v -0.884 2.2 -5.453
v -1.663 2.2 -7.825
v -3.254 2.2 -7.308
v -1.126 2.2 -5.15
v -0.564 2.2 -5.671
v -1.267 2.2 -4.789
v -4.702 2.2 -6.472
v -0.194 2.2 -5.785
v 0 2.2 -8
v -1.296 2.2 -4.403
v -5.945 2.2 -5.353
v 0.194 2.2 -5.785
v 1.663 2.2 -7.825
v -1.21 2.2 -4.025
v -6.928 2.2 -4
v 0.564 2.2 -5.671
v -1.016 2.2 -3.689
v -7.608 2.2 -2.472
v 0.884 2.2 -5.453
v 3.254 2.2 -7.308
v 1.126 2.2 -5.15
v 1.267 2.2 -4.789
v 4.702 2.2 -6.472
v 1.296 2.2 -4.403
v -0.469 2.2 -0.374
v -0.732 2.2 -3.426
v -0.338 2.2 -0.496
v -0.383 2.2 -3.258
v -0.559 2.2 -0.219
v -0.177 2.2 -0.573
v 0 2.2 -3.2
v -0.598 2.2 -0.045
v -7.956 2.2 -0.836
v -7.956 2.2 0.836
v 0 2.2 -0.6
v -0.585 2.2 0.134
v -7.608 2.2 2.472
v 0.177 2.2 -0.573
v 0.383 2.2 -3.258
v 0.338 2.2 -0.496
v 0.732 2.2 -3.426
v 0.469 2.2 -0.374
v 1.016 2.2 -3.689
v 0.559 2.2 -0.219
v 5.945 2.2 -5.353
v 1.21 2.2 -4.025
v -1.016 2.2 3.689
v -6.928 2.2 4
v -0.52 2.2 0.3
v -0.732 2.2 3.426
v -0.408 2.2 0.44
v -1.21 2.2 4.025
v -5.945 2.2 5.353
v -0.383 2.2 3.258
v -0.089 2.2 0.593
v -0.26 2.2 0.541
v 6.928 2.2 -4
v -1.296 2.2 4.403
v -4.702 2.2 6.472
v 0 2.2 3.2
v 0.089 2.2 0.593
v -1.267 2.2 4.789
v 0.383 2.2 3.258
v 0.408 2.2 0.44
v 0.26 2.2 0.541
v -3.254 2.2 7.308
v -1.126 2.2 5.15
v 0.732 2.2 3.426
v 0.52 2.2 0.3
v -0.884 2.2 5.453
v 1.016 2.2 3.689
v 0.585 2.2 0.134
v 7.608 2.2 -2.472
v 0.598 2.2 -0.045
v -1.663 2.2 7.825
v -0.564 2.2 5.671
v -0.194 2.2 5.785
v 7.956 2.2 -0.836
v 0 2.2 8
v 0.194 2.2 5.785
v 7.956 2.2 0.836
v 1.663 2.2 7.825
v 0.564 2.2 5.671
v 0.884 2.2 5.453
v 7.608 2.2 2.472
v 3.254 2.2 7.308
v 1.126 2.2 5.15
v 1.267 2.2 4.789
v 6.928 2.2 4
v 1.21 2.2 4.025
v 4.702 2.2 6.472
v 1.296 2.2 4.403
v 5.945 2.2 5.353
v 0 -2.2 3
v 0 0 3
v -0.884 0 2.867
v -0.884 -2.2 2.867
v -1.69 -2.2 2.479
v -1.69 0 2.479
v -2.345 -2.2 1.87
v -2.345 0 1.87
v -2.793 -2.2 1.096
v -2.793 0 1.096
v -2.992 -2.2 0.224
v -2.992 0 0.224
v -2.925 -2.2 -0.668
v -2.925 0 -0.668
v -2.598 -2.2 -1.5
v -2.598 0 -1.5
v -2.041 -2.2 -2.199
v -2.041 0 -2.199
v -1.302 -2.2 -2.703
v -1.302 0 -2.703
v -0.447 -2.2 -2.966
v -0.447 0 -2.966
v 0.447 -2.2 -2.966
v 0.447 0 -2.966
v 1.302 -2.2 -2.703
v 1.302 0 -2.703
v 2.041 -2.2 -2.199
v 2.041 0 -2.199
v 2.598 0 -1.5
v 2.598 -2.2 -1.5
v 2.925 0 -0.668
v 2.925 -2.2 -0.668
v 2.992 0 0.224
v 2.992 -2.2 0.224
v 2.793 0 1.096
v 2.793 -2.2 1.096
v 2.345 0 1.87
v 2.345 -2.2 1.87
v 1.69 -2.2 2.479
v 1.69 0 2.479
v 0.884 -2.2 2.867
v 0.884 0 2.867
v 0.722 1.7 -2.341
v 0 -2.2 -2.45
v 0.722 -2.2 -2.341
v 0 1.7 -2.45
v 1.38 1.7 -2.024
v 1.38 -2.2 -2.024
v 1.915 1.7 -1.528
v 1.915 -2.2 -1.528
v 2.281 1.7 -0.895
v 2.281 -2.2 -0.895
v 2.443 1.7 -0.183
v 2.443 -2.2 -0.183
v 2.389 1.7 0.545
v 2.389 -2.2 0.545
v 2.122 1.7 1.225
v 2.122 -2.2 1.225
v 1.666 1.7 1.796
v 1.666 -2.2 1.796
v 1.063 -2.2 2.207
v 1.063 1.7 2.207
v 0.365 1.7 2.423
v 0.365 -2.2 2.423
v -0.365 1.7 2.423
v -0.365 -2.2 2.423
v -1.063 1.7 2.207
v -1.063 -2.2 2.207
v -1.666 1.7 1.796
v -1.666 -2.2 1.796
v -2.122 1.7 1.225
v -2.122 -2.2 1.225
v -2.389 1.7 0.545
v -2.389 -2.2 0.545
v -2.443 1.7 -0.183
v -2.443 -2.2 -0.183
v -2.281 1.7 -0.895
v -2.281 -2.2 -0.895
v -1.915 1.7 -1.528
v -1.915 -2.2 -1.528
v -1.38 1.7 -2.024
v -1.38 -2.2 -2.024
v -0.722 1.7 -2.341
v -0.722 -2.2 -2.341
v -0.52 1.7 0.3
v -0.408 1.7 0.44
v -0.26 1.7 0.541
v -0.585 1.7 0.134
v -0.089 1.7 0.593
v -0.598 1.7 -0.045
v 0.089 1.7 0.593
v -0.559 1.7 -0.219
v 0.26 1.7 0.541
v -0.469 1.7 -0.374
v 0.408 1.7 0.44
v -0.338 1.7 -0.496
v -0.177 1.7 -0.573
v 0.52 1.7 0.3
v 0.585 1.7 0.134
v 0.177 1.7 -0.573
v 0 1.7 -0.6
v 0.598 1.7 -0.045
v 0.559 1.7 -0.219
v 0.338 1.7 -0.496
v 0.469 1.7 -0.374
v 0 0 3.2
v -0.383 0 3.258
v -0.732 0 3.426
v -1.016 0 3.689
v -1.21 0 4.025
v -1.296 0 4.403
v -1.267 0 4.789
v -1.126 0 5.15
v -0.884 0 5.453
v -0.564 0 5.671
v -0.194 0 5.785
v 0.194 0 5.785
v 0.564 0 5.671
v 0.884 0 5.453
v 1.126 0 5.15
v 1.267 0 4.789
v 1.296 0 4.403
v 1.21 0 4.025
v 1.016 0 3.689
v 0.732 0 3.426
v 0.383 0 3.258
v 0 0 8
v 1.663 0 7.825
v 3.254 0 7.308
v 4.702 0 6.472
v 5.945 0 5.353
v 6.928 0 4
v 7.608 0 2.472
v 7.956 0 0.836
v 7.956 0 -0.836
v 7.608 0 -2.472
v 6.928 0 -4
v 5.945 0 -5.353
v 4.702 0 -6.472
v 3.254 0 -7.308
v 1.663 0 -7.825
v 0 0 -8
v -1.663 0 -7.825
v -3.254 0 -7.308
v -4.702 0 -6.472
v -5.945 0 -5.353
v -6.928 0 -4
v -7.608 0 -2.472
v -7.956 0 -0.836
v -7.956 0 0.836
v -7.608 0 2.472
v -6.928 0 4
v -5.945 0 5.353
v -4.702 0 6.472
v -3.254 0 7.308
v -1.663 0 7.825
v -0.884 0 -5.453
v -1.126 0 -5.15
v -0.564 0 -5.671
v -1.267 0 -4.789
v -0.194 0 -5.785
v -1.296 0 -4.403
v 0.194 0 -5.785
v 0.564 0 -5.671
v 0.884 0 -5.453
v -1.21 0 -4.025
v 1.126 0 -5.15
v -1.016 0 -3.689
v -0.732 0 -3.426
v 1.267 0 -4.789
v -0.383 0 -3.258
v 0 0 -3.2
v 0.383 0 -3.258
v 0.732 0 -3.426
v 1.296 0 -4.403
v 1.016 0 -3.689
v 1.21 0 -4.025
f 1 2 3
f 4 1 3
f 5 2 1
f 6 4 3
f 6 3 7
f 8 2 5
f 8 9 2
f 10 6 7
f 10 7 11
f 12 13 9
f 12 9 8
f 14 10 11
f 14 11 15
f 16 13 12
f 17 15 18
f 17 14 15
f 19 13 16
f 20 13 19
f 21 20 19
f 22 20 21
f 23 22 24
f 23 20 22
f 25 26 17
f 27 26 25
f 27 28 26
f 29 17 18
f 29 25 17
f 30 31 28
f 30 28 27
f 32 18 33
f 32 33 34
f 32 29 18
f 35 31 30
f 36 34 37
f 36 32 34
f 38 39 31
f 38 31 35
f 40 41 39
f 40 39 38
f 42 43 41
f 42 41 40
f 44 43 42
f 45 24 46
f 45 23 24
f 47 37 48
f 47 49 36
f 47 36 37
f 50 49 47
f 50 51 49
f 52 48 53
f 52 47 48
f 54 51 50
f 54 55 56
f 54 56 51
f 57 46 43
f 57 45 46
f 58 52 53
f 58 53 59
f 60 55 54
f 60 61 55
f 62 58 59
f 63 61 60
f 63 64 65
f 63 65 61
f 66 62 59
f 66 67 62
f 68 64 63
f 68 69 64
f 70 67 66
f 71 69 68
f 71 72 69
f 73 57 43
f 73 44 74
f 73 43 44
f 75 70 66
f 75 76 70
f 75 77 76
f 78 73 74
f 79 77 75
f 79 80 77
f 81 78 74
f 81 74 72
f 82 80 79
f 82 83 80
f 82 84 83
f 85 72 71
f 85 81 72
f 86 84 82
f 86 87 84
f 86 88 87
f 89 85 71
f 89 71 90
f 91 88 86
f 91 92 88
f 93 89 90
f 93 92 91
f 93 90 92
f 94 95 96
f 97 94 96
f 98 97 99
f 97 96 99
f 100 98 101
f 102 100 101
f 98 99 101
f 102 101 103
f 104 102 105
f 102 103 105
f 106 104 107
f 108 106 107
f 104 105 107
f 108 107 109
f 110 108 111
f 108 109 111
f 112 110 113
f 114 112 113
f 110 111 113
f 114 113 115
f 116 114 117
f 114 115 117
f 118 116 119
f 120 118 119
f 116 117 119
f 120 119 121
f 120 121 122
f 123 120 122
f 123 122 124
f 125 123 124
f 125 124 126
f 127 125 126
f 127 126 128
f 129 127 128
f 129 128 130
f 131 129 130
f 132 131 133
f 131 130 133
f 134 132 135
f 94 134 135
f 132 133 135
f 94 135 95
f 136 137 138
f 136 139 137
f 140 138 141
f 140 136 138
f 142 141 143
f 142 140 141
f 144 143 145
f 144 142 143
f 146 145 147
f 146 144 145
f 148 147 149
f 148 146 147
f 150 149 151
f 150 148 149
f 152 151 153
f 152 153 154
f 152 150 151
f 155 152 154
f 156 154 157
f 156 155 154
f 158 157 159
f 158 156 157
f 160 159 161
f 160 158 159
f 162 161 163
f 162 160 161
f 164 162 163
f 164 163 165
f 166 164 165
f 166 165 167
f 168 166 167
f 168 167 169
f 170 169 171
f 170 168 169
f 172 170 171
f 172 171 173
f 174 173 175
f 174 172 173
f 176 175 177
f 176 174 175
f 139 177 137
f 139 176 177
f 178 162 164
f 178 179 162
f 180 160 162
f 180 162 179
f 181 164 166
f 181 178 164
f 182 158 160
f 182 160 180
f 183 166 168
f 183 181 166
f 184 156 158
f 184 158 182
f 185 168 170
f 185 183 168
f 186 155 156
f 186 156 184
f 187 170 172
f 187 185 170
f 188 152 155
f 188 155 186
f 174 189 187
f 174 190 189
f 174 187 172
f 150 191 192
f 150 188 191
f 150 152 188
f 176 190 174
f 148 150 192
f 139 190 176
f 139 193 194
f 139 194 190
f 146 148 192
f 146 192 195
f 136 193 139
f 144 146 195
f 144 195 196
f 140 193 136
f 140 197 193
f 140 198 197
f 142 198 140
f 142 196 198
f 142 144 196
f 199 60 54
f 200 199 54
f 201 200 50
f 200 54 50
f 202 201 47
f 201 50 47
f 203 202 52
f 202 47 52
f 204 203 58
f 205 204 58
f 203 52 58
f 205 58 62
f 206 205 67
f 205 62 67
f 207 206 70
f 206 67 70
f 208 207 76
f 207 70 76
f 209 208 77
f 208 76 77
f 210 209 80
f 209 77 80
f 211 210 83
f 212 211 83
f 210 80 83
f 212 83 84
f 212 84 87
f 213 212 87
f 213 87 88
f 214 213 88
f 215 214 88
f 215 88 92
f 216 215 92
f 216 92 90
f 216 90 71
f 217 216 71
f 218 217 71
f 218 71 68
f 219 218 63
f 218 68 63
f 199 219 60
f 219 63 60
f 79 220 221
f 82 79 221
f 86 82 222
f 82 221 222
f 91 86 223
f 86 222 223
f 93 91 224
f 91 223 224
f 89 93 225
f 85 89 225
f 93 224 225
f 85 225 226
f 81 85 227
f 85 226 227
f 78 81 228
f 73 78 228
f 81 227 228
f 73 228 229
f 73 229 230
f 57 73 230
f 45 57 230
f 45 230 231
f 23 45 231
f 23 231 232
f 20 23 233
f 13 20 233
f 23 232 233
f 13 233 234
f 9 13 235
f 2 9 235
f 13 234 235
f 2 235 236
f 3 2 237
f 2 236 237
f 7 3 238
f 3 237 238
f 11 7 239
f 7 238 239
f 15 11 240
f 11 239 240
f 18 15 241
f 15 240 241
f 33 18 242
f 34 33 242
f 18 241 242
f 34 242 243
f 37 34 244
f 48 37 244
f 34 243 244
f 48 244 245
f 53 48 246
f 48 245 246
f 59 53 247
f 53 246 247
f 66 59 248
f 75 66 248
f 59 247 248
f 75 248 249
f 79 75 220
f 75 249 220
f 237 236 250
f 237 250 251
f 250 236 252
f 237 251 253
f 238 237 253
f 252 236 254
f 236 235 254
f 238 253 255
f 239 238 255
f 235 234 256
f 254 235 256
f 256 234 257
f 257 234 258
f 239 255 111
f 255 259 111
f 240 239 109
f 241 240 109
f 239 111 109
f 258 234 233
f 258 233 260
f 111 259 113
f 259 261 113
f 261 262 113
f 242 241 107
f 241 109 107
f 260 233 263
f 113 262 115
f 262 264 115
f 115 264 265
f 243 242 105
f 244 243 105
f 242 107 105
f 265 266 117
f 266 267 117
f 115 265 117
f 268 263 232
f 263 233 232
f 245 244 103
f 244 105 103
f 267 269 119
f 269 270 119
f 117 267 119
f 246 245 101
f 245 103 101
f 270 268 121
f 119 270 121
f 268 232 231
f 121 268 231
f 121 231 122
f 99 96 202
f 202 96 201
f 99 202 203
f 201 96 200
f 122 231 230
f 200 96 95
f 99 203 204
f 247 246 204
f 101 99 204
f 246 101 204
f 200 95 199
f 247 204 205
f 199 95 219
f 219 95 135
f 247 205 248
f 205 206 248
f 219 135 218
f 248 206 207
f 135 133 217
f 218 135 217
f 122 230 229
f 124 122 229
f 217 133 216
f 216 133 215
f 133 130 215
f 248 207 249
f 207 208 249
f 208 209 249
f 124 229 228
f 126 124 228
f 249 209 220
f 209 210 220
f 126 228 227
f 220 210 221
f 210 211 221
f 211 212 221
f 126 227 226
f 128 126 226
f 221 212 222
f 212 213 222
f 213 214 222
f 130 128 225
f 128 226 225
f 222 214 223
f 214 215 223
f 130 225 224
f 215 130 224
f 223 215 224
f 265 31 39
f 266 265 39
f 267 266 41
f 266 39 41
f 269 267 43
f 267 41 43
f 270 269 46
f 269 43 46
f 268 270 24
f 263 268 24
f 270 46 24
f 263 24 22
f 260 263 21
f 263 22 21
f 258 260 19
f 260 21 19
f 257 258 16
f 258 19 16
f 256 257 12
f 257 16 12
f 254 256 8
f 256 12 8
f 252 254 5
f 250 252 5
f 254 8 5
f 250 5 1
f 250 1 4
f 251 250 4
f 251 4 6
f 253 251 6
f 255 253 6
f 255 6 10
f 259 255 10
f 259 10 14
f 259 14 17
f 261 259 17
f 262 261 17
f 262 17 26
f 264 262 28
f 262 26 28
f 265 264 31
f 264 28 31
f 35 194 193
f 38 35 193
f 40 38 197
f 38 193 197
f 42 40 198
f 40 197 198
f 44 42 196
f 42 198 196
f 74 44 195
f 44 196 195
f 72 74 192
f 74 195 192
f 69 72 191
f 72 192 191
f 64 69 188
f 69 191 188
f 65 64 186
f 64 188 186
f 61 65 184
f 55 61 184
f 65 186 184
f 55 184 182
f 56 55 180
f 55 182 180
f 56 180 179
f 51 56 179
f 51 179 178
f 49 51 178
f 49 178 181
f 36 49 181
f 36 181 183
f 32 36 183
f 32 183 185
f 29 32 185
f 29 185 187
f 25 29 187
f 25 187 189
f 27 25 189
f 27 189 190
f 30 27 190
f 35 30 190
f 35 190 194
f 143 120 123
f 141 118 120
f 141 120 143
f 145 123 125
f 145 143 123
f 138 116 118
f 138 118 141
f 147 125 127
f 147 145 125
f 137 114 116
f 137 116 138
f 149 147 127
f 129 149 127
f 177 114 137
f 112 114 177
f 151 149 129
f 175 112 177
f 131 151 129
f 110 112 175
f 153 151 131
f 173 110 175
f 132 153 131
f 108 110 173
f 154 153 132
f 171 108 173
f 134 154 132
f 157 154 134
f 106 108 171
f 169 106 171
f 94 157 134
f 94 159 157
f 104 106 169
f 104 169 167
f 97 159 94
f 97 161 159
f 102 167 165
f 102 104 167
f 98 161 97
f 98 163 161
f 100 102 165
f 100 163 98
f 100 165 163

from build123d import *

# Parameters (mm, degrees)
SKETCH1_R           = 8
BOSS_EXTRUDE1_DEPTH = 2.2
SKETCH2_R           = 1.3
CUT_EXTRUDE1_DEPTH  = 2.2
SKETCH3_R           = 3
SKETCH3_R_2         = 2.45
BOSS_EXTRUDE2_DEPTH = 2.2
SKETCH8_R           = 0.6
CUT_EXTRUDE7_DEPTH  = 2.2
CUT_EXTRUDE8_START  = -1.7
SKETCH9_R           = 2.45
CUT_EXTRUDE8_DEPTH  = 1.7


with BuildPart() as part:
    # Sketch1 → Boss-Extrude1 (new body)
    with BuildSketch(Plane(origin=(0, 0, 0), x_dir=(1, 0, 0), z_dir=(0, 1, 0))):
        with Locations(Location((0, 0, 0), (0, 0, 270))):
            Circle(SKETCH1_R)
    extrude(amount=BOSS_EXTRUDE1_DEPTH)

    # Sketch2 → Cut-Extrude1 (cut)
    with BuildSketch(Plane(origin=(0, 2.2, 0), x_dir=(1, 0, 0), z_dir=(0, 1, 0))):
        with Locations(Location((0, 4.5, 0), (0, 0, 270))):
            Circle(SKETCH2_R)
        with Locations(Location((0, -4.5, 0), (0, 0, 90))):
            Circle(SKETCH2_R)
    extrude(amount=-CUT_EXTRUDE1_DEPTH, mode=Mode.SUBTRACT)

    # Sketch3 → Boss-Extrude2 (add)
    with BuildSketch(Plane.XZ):
        with Locations(Location((0, 0, 0), (0, 0, 90))):
            Circle(SKETCH3_R)
        with Locations(Location((0, 0, 0), (0, 0, 270))):
            Circle(SKETCH3_R_2, mode=Mode.SUBTRACT)
    extrude(amount=BOSS_EXTRUDE2_DEPTH)

    # Sketch8 → Cut-Extrude7 (cut)
    with BuildSketch(Plane.XZ):
        with Locations(Location((0, 0, 0), (0, 0, 270))):
            Circle(SKETCH8_R)
    extrude(amount=-CUT_EXTRUDE7_DEPTH, mode=Mode.SUBTRACT)

    # Sketch9 → Cut-Extrude8 (cut)
    with BuildSketch(Plane.XZ.offset(CUT_EXTRUDE8_START)):
        with Locations(Location((0, 0, 0), (0, 0, 270))):
            Circle(SKETCH9_R)
    extrude(amount=CUT_EXTRUDE8_DEPTH, mode=Mode.SUBTRACT)


solid = part.part
